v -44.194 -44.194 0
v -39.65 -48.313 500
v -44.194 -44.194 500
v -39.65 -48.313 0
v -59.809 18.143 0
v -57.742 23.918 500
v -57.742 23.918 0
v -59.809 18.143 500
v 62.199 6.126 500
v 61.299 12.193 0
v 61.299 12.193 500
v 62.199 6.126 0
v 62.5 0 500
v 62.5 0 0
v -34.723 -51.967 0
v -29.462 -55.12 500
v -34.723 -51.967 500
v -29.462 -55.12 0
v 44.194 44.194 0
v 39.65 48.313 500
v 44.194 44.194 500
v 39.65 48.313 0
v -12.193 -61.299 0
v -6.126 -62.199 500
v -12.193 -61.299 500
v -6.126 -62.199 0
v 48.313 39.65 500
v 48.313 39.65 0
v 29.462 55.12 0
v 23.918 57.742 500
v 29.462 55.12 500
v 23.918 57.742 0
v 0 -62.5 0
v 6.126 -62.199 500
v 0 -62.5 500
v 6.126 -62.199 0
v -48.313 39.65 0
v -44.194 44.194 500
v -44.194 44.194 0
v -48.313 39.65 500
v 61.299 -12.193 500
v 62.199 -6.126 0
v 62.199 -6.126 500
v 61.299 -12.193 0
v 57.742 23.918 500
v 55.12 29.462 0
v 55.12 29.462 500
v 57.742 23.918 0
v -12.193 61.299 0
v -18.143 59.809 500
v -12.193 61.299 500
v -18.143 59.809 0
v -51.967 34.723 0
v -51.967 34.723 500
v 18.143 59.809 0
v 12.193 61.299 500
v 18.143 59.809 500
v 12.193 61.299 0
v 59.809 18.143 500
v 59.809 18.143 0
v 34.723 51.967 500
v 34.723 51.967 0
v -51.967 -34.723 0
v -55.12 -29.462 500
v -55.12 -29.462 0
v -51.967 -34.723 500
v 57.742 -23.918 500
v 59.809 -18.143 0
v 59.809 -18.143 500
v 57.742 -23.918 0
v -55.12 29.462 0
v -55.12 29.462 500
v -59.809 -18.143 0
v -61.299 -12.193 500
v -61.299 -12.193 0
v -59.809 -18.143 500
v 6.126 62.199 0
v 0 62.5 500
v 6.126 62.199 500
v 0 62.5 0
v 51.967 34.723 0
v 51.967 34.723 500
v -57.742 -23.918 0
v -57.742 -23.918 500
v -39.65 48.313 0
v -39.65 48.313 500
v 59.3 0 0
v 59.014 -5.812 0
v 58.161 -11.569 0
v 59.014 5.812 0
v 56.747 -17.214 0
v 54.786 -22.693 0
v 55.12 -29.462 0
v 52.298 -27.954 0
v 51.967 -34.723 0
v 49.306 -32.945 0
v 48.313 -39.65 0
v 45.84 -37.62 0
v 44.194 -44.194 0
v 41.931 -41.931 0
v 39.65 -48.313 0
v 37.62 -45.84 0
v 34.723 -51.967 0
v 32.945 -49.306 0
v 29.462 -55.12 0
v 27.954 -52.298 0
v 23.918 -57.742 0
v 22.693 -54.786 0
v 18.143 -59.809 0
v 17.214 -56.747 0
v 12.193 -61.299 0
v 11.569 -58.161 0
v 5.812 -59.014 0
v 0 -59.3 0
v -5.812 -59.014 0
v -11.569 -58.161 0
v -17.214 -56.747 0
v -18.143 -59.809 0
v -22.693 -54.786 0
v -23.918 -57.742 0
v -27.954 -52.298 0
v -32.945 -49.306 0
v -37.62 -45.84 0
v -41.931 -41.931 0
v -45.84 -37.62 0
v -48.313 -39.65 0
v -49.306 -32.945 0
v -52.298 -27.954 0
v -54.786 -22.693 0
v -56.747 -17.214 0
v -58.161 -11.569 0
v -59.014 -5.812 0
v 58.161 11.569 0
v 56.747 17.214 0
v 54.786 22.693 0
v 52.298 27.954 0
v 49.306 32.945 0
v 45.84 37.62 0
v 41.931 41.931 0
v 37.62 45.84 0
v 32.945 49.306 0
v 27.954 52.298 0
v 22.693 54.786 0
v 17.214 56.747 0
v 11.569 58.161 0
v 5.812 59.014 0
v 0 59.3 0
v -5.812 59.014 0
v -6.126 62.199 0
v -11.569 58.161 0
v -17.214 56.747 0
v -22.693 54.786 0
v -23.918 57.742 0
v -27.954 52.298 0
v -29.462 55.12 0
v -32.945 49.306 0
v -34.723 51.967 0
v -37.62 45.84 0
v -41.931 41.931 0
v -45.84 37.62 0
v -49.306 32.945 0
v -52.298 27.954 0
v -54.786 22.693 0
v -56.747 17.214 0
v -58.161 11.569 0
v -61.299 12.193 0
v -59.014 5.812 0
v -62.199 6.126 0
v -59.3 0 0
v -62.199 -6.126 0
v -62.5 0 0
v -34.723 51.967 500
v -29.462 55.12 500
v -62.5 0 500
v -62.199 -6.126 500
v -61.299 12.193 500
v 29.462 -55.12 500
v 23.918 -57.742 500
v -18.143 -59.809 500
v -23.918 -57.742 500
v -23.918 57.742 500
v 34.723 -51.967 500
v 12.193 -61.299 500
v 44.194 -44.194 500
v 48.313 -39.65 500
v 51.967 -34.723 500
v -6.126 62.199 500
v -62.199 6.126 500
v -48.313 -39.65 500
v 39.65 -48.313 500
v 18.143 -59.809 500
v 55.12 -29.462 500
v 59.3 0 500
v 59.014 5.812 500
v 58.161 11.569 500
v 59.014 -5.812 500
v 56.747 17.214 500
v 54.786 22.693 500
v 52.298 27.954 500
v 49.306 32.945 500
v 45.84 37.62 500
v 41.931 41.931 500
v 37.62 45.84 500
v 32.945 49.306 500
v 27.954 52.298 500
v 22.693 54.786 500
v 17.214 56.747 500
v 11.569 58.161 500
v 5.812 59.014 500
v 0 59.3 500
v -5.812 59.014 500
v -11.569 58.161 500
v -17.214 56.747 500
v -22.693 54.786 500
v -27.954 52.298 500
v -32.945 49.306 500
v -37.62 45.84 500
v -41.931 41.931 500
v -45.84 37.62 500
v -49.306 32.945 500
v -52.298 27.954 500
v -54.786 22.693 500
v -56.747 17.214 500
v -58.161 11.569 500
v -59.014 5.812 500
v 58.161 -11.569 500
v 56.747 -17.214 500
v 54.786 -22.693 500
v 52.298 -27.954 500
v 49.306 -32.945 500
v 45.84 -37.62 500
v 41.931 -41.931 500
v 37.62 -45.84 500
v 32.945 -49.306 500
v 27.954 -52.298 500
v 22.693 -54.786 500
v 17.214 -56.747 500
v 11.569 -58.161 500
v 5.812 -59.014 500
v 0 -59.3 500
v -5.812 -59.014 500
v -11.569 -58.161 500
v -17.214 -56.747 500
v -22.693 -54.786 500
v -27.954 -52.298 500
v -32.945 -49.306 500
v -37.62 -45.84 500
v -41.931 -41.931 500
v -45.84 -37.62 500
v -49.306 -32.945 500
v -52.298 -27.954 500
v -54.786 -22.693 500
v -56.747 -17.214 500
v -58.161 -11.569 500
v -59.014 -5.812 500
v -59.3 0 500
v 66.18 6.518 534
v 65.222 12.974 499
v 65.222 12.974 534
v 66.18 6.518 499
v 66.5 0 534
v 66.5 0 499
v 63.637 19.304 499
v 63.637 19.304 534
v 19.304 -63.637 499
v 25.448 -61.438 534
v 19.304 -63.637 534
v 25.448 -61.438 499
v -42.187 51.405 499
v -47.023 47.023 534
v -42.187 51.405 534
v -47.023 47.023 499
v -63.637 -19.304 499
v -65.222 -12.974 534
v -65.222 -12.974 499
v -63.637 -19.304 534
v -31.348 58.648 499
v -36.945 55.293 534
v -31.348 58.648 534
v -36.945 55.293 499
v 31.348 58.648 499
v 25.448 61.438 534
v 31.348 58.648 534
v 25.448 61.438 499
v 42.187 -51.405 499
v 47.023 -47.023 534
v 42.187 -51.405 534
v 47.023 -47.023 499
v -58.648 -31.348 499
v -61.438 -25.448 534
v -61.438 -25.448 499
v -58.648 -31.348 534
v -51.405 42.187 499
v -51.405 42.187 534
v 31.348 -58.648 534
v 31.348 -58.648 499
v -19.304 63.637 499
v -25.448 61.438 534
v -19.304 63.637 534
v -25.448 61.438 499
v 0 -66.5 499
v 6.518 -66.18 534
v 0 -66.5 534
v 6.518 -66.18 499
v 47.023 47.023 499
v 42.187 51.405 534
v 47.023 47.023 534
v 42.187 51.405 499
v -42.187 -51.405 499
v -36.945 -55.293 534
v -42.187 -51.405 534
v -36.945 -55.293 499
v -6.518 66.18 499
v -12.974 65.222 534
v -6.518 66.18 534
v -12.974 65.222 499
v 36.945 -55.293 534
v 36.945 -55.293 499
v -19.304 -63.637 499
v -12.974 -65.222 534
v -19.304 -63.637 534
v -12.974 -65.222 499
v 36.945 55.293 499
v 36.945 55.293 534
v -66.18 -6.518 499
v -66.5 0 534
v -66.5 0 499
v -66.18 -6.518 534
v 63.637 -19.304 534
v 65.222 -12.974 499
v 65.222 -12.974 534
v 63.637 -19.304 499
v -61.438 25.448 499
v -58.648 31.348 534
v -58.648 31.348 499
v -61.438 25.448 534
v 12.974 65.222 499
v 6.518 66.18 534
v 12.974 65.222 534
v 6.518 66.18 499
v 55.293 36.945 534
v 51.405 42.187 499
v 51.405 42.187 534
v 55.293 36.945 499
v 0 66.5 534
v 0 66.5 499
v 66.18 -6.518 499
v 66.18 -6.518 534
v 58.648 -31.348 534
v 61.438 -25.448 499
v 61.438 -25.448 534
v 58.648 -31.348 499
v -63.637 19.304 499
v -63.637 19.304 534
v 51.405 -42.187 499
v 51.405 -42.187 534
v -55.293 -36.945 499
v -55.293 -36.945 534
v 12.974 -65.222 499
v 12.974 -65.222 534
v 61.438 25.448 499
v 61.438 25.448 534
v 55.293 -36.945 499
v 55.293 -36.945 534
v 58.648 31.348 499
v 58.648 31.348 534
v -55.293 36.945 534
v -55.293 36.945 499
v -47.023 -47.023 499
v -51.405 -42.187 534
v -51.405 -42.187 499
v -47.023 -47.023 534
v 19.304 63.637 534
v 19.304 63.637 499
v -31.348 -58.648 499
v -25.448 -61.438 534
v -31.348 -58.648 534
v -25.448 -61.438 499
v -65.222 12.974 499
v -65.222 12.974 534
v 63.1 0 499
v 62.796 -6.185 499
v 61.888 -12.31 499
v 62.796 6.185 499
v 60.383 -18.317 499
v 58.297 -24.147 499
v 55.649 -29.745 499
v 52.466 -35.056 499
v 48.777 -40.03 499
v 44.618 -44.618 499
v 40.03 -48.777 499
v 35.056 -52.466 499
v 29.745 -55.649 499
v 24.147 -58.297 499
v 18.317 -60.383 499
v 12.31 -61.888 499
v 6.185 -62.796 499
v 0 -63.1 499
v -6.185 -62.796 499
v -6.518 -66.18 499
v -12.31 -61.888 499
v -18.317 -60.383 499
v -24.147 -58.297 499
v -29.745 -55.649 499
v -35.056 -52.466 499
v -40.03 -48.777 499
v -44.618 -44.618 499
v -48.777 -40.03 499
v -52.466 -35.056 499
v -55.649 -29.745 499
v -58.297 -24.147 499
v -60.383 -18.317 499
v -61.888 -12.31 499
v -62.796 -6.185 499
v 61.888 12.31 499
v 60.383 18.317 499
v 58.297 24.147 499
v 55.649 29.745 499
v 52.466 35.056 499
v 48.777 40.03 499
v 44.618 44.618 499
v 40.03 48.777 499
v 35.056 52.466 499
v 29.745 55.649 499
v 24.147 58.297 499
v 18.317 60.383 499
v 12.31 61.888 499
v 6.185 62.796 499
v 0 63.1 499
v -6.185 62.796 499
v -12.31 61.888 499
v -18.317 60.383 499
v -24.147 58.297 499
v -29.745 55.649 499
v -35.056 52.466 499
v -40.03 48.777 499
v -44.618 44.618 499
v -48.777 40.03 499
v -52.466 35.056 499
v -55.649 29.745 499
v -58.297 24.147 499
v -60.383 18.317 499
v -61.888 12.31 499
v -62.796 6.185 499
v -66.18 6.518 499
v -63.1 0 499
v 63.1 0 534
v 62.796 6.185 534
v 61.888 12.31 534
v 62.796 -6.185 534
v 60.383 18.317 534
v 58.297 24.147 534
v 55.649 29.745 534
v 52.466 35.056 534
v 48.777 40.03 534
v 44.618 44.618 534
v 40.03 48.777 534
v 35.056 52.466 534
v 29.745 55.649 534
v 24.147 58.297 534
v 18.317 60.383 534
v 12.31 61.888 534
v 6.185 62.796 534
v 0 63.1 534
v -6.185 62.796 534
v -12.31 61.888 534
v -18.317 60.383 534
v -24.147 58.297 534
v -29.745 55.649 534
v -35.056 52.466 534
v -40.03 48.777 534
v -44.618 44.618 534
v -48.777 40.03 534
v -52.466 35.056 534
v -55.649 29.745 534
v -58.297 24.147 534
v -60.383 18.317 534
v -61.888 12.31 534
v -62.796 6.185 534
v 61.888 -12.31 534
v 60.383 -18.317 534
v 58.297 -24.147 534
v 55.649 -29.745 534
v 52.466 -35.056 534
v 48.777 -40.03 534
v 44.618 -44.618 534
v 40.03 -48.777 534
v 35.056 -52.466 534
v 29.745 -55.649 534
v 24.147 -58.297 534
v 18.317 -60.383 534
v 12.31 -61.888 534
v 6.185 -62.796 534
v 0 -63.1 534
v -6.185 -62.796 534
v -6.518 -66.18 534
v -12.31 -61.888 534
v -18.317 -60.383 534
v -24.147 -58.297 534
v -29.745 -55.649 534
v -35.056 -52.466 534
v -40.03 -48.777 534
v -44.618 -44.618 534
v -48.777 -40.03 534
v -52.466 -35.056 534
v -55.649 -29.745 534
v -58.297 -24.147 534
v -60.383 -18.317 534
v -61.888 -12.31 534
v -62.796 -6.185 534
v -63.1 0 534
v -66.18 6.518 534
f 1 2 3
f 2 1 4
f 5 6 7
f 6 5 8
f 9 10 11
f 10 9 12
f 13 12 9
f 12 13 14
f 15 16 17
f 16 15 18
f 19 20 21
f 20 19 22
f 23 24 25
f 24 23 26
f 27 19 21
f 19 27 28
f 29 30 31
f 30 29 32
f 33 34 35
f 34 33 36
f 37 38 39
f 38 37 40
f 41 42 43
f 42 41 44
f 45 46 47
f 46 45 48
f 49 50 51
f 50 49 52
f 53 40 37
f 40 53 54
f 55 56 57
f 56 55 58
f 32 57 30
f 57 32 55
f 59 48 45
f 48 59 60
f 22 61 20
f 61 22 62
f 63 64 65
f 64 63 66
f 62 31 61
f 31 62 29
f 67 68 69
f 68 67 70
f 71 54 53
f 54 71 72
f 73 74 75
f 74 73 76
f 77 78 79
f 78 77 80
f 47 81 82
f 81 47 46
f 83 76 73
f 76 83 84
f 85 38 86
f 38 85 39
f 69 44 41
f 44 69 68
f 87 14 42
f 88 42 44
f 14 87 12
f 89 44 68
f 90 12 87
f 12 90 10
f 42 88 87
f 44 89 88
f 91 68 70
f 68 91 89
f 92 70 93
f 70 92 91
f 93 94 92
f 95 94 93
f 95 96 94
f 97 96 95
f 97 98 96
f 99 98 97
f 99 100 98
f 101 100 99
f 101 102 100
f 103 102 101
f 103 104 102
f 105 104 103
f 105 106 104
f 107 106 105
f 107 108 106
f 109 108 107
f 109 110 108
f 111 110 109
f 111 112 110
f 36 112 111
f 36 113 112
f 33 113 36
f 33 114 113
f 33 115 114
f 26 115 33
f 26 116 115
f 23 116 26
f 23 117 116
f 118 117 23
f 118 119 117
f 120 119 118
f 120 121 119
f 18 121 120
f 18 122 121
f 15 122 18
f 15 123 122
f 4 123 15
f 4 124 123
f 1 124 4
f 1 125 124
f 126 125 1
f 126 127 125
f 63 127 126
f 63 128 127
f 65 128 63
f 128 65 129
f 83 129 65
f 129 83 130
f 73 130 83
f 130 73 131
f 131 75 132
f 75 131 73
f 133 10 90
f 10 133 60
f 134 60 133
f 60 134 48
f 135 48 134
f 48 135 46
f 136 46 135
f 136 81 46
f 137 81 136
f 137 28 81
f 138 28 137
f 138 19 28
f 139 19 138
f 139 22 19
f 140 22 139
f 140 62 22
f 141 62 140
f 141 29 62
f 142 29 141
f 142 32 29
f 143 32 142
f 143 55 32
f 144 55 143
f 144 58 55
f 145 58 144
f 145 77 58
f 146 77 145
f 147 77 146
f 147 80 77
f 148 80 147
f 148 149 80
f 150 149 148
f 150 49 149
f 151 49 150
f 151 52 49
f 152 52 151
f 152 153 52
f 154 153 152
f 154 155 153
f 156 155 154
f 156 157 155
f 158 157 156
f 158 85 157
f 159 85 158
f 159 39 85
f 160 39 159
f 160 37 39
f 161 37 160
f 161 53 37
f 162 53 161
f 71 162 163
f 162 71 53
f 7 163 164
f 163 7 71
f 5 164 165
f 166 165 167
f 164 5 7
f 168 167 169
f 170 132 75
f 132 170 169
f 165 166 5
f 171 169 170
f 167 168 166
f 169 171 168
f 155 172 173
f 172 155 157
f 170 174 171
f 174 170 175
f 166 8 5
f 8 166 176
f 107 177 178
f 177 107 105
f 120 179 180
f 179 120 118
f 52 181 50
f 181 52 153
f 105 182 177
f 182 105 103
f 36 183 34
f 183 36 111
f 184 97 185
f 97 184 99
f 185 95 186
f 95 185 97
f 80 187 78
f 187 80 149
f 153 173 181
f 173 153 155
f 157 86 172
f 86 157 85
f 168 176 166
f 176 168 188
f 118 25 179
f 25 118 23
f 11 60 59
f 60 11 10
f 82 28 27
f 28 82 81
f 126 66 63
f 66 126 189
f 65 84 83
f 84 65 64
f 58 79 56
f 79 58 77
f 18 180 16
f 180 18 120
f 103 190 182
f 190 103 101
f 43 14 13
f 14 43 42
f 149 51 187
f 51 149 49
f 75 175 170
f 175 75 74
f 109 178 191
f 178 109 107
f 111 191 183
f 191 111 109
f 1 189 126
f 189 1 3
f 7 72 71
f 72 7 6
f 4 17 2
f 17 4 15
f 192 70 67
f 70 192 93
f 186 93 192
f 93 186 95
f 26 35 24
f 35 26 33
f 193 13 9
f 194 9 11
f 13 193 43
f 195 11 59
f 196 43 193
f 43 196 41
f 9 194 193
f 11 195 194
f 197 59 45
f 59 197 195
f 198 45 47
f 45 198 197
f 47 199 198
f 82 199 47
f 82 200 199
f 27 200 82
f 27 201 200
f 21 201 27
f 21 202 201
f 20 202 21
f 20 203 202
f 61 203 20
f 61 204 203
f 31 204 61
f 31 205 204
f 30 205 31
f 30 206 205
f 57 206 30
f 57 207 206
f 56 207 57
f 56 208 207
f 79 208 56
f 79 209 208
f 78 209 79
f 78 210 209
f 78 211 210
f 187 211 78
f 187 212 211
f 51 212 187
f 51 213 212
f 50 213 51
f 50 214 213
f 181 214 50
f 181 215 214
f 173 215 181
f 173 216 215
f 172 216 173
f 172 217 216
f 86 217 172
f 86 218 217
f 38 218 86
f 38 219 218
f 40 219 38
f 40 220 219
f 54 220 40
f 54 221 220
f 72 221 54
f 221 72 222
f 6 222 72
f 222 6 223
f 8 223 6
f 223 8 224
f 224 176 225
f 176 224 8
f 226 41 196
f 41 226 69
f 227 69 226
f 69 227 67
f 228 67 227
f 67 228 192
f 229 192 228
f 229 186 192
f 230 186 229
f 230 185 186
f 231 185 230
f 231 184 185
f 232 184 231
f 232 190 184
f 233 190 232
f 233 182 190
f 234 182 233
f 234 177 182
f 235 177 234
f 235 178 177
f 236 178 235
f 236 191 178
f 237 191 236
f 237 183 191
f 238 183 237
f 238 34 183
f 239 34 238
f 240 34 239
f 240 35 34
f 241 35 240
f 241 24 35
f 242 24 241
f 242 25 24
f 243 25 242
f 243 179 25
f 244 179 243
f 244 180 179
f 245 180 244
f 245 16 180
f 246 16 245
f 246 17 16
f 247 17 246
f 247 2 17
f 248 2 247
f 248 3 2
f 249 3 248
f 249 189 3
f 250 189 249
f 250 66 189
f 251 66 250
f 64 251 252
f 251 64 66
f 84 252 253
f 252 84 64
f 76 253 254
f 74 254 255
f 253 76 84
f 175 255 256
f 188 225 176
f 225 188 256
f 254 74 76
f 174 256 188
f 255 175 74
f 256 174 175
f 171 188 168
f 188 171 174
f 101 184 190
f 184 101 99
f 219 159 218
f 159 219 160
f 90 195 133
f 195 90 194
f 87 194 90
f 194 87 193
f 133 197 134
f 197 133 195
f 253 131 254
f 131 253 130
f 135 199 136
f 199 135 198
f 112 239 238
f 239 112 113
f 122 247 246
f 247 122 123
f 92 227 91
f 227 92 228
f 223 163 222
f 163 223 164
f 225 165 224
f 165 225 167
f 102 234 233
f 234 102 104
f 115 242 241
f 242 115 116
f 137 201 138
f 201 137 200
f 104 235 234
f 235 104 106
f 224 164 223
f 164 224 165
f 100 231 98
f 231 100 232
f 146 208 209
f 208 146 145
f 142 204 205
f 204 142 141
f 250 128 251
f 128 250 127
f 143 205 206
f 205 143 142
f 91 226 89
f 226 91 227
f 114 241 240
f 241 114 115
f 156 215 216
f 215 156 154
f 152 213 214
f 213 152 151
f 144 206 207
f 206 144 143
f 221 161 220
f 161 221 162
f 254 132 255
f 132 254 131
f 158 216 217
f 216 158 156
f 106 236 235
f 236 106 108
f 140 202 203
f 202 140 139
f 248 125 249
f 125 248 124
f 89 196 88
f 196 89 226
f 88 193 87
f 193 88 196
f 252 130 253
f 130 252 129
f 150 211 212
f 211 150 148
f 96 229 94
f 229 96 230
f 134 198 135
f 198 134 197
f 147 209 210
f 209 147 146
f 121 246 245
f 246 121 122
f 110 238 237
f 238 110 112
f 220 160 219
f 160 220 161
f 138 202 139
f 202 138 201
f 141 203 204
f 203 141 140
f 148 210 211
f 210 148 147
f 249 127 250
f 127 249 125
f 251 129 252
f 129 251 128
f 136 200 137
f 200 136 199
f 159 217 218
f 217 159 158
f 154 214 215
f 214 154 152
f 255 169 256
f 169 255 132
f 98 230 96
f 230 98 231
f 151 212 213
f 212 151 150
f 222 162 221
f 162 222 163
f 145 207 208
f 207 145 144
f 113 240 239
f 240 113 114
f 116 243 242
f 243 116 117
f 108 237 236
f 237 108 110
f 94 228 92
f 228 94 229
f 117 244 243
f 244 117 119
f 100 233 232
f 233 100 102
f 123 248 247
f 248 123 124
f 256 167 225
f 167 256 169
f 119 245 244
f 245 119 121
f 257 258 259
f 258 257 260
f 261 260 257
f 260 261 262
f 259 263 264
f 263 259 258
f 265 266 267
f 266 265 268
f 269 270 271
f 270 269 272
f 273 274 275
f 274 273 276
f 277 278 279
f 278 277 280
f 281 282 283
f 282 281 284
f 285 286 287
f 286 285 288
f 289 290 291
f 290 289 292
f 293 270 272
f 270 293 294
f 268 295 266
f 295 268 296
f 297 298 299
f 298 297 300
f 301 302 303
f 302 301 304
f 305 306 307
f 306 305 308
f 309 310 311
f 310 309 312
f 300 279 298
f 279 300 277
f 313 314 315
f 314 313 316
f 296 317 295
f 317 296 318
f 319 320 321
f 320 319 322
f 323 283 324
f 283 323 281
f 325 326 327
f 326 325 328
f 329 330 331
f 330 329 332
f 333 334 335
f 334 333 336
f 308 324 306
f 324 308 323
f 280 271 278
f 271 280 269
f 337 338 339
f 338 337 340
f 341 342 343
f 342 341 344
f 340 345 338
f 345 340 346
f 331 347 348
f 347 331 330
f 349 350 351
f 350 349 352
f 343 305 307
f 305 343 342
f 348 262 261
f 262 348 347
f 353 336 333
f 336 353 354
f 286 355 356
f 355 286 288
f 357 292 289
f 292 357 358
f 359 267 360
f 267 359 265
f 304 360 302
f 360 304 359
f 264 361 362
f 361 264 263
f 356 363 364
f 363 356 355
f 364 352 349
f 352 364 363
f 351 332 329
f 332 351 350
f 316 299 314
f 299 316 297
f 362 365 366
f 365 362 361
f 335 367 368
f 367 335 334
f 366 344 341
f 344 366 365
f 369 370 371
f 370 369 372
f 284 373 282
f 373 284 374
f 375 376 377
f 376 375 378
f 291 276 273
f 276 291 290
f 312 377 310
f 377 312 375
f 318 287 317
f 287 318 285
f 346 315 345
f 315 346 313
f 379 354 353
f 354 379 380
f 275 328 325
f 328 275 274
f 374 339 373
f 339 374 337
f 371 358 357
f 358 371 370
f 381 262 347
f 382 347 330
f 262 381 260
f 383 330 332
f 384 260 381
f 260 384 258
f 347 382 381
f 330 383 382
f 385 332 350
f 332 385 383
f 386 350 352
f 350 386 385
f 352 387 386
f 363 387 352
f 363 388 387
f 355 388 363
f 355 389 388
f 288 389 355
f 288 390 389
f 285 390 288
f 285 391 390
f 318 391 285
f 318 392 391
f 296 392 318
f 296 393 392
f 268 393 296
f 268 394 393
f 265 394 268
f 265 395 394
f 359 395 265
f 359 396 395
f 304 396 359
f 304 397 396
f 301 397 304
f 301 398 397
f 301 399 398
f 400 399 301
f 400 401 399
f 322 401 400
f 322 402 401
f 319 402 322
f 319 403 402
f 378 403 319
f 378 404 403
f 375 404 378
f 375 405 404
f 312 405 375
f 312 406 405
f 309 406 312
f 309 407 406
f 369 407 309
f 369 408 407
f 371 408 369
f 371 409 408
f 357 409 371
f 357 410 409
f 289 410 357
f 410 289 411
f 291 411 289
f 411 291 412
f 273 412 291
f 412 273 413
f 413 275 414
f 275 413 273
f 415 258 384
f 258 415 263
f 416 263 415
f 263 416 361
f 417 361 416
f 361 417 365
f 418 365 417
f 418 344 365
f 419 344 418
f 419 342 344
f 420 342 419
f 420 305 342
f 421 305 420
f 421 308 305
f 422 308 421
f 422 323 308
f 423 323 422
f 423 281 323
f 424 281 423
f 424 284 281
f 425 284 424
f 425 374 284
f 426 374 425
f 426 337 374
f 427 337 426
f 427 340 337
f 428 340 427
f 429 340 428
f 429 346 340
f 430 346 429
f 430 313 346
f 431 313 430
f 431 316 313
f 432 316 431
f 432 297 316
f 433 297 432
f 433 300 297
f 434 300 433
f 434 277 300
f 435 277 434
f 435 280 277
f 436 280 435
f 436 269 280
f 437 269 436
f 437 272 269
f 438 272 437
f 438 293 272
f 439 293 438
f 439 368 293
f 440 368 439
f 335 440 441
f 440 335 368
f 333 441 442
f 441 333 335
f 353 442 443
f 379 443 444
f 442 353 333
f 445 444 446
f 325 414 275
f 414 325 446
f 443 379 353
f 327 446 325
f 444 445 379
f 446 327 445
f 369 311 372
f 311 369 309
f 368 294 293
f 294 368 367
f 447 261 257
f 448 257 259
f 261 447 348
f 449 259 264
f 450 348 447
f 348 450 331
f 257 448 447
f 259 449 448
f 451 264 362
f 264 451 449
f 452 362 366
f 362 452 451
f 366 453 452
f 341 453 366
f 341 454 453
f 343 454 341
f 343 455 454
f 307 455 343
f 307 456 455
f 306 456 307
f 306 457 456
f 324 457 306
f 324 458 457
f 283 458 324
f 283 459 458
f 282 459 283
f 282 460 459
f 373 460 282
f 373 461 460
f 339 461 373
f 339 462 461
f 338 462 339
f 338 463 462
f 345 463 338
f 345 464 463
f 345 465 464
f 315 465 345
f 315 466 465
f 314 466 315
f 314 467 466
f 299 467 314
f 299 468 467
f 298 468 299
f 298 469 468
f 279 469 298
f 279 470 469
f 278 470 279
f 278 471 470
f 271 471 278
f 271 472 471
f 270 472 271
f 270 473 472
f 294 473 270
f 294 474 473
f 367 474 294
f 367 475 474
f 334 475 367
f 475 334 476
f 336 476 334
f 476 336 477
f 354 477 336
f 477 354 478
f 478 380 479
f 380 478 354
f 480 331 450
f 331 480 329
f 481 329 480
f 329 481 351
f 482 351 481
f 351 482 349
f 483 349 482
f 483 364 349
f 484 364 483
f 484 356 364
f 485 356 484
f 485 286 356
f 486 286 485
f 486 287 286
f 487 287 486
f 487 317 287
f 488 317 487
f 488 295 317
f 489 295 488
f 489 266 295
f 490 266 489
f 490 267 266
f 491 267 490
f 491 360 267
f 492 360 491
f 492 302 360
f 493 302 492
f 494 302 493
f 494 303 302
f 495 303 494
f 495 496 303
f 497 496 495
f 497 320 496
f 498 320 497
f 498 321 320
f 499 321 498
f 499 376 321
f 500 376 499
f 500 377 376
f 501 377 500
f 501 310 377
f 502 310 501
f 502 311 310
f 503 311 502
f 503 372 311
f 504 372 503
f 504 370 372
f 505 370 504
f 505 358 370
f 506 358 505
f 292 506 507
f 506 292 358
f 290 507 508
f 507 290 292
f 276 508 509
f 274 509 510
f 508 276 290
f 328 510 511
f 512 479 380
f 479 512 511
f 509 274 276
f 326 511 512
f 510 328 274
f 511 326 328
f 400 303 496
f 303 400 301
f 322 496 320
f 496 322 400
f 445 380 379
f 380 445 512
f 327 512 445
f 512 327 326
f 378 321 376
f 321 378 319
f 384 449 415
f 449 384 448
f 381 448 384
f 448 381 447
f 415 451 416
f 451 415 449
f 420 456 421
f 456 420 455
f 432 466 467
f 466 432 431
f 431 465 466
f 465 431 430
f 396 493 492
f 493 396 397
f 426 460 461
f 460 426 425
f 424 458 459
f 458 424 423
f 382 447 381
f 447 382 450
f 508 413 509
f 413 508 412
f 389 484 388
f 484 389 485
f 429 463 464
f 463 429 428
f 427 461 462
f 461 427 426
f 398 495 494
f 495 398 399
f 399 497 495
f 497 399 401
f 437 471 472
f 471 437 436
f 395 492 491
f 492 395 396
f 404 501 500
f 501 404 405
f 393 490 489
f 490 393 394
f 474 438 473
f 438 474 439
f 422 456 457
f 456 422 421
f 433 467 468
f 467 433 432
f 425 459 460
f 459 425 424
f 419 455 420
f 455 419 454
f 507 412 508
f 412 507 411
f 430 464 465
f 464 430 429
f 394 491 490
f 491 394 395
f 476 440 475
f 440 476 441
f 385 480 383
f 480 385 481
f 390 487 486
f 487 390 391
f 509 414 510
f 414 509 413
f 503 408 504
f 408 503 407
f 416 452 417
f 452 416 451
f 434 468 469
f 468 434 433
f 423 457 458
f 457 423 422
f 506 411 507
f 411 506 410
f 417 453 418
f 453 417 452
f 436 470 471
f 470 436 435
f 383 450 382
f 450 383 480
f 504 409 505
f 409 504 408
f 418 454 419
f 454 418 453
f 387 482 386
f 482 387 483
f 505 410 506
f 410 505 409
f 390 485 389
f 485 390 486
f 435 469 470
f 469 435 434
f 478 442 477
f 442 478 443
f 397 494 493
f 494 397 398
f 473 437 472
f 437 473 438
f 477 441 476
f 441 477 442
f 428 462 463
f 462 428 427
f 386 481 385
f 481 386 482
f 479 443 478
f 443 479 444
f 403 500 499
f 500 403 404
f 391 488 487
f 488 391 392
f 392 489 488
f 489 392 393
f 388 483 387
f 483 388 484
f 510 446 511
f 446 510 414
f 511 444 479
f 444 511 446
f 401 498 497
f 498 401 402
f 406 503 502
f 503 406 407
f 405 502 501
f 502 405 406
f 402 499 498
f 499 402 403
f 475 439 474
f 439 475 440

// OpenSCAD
// Parameters
length_mm = 500; //[250:1000:1]
center = 0; //[0:1:1]
include_fitting_end = 1; //[0:1:1]
ht125_outer_diameter = 125; //[62.5:250:0.1]
ht125_wall_thickness = 3.2; //[1.6:6.4:0.1]
end_face_thickness = 1.5; //[0.5:3:0.1]
fit_overlap = 1; //[0.5:2:0.1]
fitting_height = 35; //[15:70:1]
fitting_radial_thickness = 4; //[2:8:0.1]
fitting_clearance = 0.6; //[0.2:1.2:0.1]
z0_offset = 0; //[-500:500:1]

// Module for the HT Pipe
module ht_pipe() {
  color([0.85, 0.85, 0.8]) {
    // Main pipe body
    difference() {
      translate([0, 0, z0_offset])
        cylinder(h=length_mm, r=ht125_outer_diameter/2, center=false, $fn=64);
      translate([0, 0, z0_offset])
        cylinder(h=length_mm, r=ht125_outer_diameter/2 - ht125_wall_thickness, center=false, $fn=64);
    }
    
    // End faces
    union() {
      // Bottom end face
      difference() {
        translate([0, 0, z0_offset])
          cylinder(h=end_face_thickness, r=ht125_outer_diameter/2, center=false, $fn=64);
        translate([0, 0, z0_offset])
          cylinder(h=end_face_thickness, r=ht125_outer_diameter/2 - ht125_wall_thickness, center=false, $fn=64);
      }
      // Top end face
      difference() {
        translate([0, 0, z0_offset + length_mm - end_face_thickness])
          cylinder(h=end_face_thickness, r=ht125_outer_diameter/2, center=false, $fn=64);
        translate([0, 0, z0_offset + length_mm - end_face_thickness])
          cylinder(h=end_face_thickness, r=ht125_outer_diameter/2 - ht125_wall_thickness, center=false, $fn=64);
      }
    }
    
    // Optional fitting socket
    if (include_fitting_end) {
      difference() {
        translate([0, 0, z0_offset + length_mm - fit_overlap])
          cylinder(h=fitting_height, r=ht125_outer_diameter/2 + fitting_radial_thickness, center=false, $fn=64);
        translate([0, 0, z0_offset + length_mm - fit_overlap])
          cylinder(h=fitting_height, r=ht125_outer_diameter/2 + fitting_clearance, center=false, $fn=64);
      }
    }
  }
}

// Assembly
module assembly() {
  ht_pipe();
}

assembly();
